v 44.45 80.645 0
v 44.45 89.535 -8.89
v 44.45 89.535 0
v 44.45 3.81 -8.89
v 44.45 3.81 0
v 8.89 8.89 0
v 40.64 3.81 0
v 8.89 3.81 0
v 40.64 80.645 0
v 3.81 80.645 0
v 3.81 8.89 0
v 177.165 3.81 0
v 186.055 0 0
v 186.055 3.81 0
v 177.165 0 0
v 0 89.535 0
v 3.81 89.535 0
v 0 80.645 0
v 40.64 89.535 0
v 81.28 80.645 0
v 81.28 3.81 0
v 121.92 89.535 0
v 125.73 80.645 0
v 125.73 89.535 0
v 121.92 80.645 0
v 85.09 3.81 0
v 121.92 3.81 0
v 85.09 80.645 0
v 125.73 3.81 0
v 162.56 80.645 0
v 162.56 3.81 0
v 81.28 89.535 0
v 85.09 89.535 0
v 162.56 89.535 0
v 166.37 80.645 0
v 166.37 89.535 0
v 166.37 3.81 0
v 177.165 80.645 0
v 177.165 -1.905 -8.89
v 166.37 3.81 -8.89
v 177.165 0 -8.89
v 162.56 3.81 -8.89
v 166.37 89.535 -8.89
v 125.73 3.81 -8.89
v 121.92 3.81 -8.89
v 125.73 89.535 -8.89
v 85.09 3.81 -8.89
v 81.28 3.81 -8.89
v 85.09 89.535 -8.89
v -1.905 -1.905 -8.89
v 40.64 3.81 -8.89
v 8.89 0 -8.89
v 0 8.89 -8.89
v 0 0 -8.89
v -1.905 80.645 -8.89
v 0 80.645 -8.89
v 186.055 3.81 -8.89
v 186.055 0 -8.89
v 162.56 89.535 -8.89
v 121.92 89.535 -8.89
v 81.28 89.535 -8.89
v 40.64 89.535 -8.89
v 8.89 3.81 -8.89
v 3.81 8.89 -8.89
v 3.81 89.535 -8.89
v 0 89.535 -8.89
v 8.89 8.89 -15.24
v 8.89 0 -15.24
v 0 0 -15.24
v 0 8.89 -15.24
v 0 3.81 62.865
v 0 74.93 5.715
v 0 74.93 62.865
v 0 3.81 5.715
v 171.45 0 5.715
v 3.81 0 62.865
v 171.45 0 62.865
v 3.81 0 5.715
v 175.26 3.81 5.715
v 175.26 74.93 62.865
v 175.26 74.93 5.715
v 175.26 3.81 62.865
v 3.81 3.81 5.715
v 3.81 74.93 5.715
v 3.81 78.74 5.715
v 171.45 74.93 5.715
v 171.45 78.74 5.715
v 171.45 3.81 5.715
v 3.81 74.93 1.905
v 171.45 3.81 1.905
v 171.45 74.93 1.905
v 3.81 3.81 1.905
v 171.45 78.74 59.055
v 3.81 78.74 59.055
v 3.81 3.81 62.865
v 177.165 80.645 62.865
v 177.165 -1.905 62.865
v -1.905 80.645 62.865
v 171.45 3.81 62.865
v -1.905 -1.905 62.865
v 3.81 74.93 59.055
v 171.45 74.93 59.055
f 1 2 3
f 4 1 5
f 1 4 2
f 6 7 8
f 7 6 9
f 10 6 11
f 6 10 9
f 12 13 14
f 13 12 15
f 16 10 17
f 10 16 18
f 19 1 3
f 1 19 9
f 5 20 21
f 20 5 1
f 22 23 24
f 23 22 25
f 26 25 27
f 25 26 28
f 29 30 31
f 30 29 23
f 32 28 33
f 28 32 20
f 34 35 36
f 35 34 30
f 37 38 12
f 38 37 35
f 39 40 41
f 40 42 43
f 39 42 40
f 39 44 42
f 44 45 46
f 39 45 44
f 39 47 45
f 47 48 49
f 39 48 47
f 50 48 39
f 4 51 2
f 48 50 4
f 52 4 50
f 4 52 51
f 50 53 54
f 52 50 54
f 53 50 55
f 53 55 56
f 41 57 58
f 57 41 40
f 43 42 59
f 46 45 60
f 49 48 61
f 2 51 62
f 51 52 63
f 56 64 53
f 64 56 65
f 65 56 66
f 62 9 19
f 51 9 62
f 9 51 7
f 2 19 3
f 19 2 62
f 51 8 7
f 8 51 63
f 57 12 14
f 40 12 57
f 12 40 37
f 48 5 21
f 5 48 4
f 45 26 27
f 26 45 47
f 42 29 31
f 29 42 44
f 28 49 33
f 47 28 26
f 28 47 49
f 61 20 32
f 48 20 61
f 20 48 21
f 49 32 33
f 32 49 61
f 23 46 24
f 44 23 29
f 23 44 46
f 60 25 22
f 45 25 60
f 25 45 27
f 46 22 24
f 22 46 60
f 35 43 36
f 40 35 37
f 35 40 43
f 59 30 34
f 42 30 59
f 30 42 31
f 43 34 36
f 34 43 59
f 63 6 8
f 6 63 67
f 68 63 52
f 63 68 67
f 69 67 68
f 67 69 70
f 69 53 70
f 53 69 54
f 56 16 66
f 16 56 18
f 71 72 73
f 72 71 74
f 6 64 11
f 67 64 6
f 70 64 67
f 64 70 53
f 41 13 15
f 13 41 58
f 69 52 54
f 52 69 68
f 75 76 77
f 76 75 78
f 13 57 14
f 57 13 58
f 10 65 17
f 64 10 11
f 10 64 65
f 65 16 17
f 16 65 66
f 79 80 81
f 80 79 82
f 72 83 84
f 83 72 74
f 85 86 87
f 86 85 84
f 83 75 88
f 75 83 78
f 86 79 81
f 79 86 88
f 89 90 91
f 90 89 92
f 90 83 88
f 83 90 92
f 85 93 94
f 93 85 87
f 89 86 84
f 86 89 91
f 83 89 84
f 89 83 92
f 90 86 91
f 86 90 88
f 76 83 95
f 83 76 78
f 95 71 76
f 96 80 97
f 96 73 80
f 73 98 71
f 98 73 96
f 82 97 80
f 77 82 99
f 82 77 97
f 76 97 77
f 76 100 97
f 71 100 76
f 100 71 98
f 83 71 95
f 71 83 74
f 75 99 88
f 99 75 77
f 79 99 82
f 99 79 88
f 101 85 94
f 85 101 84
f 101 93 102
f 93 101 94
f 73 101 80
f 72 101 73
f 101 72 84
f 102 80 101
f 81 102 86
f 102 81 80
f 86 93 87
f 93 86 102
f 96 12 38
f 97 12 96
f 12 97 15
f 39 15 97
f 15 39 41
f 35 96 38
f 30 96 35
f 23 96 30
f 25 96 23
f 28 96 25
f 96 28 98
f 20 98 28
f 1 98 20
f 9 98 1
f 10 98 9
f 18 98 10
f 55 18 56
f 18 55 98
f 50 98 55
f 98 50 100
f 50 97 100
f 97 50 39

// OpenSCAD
inner_x = i2m (66) + (i2m (1.5) * 2);
inner_y = i2m (28) + (i2m (1.5) * 2);
inner_z = i2m (24);

function i2m (i) = i * 2.54;
function m2i (m) = m / 2.54;

module xcube (d, xyz, c = "Gold")
{
  echo (d, " -- x=", m2i (xyz [0]), ", y=", m2i (xyz [1]), ", z=", m2i (xyz [2]));
  color (c)
    cube (xyz);
}

module lower_frame (c) {
  translate ([0, 0, -i2m (6)])
    xcube ("4x4", [i2m (3.5), i2m (3.5), i2m (6)]);
  translate ([i2m (3.5), 0, -i2m (3.5)])
    xcube ("2x4: front LtR", [inner_x - i2m (3.5) + i2m (0.75) + i2m (3.5), i2m (1.5), i2m (3.5)], c ? c : "LightPink");
  translate ([0, i2m (3.5), -i2m (3.5)])
    xcube ("2x4: left FtR", [i2m (1.5), inner_y + i2m (0.75), i2m (3.5)]);
  for (y = [16, 32, 48, 64])
    translate ([i2m (y), i2m (1.5), -i2m (3.5)])
      xcube ("2x4: 1of4 FtR", [i2m (1.5), -i2m (1.5) + inner_y + i2m (0.75) + i2m (3.5), i2m (3.5)]);
}

module plywood (c) {
  translate ([0, 0, 0])
    xcube ("ply: deck", [inner_x + i2m (0.75), inner_y + i2m (0.75), i2m (0.75)], c ? c : "LightBlue");
  translate ([-i2m (0.75), -i2m (0.75), i2m (-3.5)])
    xcube ("ply: front", [i2m (0.75) + inner_x + i2m (0.75), i2m (0.75), i2m (3.5) + i2m (0.75) + inner_z], c ? c : "LightSkyBlue");
  translate ([0, inner_y, i2m (0.75)])
    xcube ("ply: back", [inner_x, i2m (0.75), inner_z], c ? c : "LightSkyBlue");
  translate ([-i2m (0.75), 0, -i2m (3.5)])
    xcube ("ply: left", [i2m (0.75), inner_y + i2m (0.75), i2m (3.5) + i2m (0.75) + inner_z], c ? c : "DeepSkyBlue");
  translate ([inner_x, 0, i2m (0.75)])
    xcube ("ply: right", [i2m (0.75), inner_y + i2m (0.75), inner_z], c ? c : "DeepSkyBlue");
}

module inner_frame (c) {
  for (y = [0, inner_y - i2m (1.5)])
    translate ([0, y, i2m (0.75)])
      xcube ("2x2: bottom front/back", [inner_x, i2m (1.5), i2m (1.5)], c ? c : "Gold");
  translate ([0, inner_y - i2m (1.5), inner_z - i2m (0.75)])
    xcube ("2x2: top back", [inner_x, i2m (1.5), i2m (1.5)], c ? c : "Gold");

  for (x = [0, inner_x - i2m (1.5)])
    translate ([x, i2m (1.5), i2m (0.75)])
      xcube ("2x2: bottom left/right", [i2m (1.5), inner_y - (i2m (1.5) * 2), i2m (1.5)], c ? c : "Gold");

  for (x = [0, inner_x - i2m (1.5)])
    translate ([x, 0, i2m (0.75) + i2m (1.5)])
      xcube ("2x2: front vert", [i2m (1.5), i2m (1.5), inner_z - i2m (1.5)], c ? c : "Yellow");

  for (x = [0, inner_x - i2m (1.5)])
    translate ([x, inner_y - i2m (1.5), i2m (0.75) + i2m (1.5)])
      xcube ("2x2: back vert", [i2m (1.5), i2m (1.5), inner_z - (i2m (1.5) * 2)], c ? c : "Yellow");
}

lower_frame ("Gold");
inner_frame ();
plywood ("DeepSkyBlue");
